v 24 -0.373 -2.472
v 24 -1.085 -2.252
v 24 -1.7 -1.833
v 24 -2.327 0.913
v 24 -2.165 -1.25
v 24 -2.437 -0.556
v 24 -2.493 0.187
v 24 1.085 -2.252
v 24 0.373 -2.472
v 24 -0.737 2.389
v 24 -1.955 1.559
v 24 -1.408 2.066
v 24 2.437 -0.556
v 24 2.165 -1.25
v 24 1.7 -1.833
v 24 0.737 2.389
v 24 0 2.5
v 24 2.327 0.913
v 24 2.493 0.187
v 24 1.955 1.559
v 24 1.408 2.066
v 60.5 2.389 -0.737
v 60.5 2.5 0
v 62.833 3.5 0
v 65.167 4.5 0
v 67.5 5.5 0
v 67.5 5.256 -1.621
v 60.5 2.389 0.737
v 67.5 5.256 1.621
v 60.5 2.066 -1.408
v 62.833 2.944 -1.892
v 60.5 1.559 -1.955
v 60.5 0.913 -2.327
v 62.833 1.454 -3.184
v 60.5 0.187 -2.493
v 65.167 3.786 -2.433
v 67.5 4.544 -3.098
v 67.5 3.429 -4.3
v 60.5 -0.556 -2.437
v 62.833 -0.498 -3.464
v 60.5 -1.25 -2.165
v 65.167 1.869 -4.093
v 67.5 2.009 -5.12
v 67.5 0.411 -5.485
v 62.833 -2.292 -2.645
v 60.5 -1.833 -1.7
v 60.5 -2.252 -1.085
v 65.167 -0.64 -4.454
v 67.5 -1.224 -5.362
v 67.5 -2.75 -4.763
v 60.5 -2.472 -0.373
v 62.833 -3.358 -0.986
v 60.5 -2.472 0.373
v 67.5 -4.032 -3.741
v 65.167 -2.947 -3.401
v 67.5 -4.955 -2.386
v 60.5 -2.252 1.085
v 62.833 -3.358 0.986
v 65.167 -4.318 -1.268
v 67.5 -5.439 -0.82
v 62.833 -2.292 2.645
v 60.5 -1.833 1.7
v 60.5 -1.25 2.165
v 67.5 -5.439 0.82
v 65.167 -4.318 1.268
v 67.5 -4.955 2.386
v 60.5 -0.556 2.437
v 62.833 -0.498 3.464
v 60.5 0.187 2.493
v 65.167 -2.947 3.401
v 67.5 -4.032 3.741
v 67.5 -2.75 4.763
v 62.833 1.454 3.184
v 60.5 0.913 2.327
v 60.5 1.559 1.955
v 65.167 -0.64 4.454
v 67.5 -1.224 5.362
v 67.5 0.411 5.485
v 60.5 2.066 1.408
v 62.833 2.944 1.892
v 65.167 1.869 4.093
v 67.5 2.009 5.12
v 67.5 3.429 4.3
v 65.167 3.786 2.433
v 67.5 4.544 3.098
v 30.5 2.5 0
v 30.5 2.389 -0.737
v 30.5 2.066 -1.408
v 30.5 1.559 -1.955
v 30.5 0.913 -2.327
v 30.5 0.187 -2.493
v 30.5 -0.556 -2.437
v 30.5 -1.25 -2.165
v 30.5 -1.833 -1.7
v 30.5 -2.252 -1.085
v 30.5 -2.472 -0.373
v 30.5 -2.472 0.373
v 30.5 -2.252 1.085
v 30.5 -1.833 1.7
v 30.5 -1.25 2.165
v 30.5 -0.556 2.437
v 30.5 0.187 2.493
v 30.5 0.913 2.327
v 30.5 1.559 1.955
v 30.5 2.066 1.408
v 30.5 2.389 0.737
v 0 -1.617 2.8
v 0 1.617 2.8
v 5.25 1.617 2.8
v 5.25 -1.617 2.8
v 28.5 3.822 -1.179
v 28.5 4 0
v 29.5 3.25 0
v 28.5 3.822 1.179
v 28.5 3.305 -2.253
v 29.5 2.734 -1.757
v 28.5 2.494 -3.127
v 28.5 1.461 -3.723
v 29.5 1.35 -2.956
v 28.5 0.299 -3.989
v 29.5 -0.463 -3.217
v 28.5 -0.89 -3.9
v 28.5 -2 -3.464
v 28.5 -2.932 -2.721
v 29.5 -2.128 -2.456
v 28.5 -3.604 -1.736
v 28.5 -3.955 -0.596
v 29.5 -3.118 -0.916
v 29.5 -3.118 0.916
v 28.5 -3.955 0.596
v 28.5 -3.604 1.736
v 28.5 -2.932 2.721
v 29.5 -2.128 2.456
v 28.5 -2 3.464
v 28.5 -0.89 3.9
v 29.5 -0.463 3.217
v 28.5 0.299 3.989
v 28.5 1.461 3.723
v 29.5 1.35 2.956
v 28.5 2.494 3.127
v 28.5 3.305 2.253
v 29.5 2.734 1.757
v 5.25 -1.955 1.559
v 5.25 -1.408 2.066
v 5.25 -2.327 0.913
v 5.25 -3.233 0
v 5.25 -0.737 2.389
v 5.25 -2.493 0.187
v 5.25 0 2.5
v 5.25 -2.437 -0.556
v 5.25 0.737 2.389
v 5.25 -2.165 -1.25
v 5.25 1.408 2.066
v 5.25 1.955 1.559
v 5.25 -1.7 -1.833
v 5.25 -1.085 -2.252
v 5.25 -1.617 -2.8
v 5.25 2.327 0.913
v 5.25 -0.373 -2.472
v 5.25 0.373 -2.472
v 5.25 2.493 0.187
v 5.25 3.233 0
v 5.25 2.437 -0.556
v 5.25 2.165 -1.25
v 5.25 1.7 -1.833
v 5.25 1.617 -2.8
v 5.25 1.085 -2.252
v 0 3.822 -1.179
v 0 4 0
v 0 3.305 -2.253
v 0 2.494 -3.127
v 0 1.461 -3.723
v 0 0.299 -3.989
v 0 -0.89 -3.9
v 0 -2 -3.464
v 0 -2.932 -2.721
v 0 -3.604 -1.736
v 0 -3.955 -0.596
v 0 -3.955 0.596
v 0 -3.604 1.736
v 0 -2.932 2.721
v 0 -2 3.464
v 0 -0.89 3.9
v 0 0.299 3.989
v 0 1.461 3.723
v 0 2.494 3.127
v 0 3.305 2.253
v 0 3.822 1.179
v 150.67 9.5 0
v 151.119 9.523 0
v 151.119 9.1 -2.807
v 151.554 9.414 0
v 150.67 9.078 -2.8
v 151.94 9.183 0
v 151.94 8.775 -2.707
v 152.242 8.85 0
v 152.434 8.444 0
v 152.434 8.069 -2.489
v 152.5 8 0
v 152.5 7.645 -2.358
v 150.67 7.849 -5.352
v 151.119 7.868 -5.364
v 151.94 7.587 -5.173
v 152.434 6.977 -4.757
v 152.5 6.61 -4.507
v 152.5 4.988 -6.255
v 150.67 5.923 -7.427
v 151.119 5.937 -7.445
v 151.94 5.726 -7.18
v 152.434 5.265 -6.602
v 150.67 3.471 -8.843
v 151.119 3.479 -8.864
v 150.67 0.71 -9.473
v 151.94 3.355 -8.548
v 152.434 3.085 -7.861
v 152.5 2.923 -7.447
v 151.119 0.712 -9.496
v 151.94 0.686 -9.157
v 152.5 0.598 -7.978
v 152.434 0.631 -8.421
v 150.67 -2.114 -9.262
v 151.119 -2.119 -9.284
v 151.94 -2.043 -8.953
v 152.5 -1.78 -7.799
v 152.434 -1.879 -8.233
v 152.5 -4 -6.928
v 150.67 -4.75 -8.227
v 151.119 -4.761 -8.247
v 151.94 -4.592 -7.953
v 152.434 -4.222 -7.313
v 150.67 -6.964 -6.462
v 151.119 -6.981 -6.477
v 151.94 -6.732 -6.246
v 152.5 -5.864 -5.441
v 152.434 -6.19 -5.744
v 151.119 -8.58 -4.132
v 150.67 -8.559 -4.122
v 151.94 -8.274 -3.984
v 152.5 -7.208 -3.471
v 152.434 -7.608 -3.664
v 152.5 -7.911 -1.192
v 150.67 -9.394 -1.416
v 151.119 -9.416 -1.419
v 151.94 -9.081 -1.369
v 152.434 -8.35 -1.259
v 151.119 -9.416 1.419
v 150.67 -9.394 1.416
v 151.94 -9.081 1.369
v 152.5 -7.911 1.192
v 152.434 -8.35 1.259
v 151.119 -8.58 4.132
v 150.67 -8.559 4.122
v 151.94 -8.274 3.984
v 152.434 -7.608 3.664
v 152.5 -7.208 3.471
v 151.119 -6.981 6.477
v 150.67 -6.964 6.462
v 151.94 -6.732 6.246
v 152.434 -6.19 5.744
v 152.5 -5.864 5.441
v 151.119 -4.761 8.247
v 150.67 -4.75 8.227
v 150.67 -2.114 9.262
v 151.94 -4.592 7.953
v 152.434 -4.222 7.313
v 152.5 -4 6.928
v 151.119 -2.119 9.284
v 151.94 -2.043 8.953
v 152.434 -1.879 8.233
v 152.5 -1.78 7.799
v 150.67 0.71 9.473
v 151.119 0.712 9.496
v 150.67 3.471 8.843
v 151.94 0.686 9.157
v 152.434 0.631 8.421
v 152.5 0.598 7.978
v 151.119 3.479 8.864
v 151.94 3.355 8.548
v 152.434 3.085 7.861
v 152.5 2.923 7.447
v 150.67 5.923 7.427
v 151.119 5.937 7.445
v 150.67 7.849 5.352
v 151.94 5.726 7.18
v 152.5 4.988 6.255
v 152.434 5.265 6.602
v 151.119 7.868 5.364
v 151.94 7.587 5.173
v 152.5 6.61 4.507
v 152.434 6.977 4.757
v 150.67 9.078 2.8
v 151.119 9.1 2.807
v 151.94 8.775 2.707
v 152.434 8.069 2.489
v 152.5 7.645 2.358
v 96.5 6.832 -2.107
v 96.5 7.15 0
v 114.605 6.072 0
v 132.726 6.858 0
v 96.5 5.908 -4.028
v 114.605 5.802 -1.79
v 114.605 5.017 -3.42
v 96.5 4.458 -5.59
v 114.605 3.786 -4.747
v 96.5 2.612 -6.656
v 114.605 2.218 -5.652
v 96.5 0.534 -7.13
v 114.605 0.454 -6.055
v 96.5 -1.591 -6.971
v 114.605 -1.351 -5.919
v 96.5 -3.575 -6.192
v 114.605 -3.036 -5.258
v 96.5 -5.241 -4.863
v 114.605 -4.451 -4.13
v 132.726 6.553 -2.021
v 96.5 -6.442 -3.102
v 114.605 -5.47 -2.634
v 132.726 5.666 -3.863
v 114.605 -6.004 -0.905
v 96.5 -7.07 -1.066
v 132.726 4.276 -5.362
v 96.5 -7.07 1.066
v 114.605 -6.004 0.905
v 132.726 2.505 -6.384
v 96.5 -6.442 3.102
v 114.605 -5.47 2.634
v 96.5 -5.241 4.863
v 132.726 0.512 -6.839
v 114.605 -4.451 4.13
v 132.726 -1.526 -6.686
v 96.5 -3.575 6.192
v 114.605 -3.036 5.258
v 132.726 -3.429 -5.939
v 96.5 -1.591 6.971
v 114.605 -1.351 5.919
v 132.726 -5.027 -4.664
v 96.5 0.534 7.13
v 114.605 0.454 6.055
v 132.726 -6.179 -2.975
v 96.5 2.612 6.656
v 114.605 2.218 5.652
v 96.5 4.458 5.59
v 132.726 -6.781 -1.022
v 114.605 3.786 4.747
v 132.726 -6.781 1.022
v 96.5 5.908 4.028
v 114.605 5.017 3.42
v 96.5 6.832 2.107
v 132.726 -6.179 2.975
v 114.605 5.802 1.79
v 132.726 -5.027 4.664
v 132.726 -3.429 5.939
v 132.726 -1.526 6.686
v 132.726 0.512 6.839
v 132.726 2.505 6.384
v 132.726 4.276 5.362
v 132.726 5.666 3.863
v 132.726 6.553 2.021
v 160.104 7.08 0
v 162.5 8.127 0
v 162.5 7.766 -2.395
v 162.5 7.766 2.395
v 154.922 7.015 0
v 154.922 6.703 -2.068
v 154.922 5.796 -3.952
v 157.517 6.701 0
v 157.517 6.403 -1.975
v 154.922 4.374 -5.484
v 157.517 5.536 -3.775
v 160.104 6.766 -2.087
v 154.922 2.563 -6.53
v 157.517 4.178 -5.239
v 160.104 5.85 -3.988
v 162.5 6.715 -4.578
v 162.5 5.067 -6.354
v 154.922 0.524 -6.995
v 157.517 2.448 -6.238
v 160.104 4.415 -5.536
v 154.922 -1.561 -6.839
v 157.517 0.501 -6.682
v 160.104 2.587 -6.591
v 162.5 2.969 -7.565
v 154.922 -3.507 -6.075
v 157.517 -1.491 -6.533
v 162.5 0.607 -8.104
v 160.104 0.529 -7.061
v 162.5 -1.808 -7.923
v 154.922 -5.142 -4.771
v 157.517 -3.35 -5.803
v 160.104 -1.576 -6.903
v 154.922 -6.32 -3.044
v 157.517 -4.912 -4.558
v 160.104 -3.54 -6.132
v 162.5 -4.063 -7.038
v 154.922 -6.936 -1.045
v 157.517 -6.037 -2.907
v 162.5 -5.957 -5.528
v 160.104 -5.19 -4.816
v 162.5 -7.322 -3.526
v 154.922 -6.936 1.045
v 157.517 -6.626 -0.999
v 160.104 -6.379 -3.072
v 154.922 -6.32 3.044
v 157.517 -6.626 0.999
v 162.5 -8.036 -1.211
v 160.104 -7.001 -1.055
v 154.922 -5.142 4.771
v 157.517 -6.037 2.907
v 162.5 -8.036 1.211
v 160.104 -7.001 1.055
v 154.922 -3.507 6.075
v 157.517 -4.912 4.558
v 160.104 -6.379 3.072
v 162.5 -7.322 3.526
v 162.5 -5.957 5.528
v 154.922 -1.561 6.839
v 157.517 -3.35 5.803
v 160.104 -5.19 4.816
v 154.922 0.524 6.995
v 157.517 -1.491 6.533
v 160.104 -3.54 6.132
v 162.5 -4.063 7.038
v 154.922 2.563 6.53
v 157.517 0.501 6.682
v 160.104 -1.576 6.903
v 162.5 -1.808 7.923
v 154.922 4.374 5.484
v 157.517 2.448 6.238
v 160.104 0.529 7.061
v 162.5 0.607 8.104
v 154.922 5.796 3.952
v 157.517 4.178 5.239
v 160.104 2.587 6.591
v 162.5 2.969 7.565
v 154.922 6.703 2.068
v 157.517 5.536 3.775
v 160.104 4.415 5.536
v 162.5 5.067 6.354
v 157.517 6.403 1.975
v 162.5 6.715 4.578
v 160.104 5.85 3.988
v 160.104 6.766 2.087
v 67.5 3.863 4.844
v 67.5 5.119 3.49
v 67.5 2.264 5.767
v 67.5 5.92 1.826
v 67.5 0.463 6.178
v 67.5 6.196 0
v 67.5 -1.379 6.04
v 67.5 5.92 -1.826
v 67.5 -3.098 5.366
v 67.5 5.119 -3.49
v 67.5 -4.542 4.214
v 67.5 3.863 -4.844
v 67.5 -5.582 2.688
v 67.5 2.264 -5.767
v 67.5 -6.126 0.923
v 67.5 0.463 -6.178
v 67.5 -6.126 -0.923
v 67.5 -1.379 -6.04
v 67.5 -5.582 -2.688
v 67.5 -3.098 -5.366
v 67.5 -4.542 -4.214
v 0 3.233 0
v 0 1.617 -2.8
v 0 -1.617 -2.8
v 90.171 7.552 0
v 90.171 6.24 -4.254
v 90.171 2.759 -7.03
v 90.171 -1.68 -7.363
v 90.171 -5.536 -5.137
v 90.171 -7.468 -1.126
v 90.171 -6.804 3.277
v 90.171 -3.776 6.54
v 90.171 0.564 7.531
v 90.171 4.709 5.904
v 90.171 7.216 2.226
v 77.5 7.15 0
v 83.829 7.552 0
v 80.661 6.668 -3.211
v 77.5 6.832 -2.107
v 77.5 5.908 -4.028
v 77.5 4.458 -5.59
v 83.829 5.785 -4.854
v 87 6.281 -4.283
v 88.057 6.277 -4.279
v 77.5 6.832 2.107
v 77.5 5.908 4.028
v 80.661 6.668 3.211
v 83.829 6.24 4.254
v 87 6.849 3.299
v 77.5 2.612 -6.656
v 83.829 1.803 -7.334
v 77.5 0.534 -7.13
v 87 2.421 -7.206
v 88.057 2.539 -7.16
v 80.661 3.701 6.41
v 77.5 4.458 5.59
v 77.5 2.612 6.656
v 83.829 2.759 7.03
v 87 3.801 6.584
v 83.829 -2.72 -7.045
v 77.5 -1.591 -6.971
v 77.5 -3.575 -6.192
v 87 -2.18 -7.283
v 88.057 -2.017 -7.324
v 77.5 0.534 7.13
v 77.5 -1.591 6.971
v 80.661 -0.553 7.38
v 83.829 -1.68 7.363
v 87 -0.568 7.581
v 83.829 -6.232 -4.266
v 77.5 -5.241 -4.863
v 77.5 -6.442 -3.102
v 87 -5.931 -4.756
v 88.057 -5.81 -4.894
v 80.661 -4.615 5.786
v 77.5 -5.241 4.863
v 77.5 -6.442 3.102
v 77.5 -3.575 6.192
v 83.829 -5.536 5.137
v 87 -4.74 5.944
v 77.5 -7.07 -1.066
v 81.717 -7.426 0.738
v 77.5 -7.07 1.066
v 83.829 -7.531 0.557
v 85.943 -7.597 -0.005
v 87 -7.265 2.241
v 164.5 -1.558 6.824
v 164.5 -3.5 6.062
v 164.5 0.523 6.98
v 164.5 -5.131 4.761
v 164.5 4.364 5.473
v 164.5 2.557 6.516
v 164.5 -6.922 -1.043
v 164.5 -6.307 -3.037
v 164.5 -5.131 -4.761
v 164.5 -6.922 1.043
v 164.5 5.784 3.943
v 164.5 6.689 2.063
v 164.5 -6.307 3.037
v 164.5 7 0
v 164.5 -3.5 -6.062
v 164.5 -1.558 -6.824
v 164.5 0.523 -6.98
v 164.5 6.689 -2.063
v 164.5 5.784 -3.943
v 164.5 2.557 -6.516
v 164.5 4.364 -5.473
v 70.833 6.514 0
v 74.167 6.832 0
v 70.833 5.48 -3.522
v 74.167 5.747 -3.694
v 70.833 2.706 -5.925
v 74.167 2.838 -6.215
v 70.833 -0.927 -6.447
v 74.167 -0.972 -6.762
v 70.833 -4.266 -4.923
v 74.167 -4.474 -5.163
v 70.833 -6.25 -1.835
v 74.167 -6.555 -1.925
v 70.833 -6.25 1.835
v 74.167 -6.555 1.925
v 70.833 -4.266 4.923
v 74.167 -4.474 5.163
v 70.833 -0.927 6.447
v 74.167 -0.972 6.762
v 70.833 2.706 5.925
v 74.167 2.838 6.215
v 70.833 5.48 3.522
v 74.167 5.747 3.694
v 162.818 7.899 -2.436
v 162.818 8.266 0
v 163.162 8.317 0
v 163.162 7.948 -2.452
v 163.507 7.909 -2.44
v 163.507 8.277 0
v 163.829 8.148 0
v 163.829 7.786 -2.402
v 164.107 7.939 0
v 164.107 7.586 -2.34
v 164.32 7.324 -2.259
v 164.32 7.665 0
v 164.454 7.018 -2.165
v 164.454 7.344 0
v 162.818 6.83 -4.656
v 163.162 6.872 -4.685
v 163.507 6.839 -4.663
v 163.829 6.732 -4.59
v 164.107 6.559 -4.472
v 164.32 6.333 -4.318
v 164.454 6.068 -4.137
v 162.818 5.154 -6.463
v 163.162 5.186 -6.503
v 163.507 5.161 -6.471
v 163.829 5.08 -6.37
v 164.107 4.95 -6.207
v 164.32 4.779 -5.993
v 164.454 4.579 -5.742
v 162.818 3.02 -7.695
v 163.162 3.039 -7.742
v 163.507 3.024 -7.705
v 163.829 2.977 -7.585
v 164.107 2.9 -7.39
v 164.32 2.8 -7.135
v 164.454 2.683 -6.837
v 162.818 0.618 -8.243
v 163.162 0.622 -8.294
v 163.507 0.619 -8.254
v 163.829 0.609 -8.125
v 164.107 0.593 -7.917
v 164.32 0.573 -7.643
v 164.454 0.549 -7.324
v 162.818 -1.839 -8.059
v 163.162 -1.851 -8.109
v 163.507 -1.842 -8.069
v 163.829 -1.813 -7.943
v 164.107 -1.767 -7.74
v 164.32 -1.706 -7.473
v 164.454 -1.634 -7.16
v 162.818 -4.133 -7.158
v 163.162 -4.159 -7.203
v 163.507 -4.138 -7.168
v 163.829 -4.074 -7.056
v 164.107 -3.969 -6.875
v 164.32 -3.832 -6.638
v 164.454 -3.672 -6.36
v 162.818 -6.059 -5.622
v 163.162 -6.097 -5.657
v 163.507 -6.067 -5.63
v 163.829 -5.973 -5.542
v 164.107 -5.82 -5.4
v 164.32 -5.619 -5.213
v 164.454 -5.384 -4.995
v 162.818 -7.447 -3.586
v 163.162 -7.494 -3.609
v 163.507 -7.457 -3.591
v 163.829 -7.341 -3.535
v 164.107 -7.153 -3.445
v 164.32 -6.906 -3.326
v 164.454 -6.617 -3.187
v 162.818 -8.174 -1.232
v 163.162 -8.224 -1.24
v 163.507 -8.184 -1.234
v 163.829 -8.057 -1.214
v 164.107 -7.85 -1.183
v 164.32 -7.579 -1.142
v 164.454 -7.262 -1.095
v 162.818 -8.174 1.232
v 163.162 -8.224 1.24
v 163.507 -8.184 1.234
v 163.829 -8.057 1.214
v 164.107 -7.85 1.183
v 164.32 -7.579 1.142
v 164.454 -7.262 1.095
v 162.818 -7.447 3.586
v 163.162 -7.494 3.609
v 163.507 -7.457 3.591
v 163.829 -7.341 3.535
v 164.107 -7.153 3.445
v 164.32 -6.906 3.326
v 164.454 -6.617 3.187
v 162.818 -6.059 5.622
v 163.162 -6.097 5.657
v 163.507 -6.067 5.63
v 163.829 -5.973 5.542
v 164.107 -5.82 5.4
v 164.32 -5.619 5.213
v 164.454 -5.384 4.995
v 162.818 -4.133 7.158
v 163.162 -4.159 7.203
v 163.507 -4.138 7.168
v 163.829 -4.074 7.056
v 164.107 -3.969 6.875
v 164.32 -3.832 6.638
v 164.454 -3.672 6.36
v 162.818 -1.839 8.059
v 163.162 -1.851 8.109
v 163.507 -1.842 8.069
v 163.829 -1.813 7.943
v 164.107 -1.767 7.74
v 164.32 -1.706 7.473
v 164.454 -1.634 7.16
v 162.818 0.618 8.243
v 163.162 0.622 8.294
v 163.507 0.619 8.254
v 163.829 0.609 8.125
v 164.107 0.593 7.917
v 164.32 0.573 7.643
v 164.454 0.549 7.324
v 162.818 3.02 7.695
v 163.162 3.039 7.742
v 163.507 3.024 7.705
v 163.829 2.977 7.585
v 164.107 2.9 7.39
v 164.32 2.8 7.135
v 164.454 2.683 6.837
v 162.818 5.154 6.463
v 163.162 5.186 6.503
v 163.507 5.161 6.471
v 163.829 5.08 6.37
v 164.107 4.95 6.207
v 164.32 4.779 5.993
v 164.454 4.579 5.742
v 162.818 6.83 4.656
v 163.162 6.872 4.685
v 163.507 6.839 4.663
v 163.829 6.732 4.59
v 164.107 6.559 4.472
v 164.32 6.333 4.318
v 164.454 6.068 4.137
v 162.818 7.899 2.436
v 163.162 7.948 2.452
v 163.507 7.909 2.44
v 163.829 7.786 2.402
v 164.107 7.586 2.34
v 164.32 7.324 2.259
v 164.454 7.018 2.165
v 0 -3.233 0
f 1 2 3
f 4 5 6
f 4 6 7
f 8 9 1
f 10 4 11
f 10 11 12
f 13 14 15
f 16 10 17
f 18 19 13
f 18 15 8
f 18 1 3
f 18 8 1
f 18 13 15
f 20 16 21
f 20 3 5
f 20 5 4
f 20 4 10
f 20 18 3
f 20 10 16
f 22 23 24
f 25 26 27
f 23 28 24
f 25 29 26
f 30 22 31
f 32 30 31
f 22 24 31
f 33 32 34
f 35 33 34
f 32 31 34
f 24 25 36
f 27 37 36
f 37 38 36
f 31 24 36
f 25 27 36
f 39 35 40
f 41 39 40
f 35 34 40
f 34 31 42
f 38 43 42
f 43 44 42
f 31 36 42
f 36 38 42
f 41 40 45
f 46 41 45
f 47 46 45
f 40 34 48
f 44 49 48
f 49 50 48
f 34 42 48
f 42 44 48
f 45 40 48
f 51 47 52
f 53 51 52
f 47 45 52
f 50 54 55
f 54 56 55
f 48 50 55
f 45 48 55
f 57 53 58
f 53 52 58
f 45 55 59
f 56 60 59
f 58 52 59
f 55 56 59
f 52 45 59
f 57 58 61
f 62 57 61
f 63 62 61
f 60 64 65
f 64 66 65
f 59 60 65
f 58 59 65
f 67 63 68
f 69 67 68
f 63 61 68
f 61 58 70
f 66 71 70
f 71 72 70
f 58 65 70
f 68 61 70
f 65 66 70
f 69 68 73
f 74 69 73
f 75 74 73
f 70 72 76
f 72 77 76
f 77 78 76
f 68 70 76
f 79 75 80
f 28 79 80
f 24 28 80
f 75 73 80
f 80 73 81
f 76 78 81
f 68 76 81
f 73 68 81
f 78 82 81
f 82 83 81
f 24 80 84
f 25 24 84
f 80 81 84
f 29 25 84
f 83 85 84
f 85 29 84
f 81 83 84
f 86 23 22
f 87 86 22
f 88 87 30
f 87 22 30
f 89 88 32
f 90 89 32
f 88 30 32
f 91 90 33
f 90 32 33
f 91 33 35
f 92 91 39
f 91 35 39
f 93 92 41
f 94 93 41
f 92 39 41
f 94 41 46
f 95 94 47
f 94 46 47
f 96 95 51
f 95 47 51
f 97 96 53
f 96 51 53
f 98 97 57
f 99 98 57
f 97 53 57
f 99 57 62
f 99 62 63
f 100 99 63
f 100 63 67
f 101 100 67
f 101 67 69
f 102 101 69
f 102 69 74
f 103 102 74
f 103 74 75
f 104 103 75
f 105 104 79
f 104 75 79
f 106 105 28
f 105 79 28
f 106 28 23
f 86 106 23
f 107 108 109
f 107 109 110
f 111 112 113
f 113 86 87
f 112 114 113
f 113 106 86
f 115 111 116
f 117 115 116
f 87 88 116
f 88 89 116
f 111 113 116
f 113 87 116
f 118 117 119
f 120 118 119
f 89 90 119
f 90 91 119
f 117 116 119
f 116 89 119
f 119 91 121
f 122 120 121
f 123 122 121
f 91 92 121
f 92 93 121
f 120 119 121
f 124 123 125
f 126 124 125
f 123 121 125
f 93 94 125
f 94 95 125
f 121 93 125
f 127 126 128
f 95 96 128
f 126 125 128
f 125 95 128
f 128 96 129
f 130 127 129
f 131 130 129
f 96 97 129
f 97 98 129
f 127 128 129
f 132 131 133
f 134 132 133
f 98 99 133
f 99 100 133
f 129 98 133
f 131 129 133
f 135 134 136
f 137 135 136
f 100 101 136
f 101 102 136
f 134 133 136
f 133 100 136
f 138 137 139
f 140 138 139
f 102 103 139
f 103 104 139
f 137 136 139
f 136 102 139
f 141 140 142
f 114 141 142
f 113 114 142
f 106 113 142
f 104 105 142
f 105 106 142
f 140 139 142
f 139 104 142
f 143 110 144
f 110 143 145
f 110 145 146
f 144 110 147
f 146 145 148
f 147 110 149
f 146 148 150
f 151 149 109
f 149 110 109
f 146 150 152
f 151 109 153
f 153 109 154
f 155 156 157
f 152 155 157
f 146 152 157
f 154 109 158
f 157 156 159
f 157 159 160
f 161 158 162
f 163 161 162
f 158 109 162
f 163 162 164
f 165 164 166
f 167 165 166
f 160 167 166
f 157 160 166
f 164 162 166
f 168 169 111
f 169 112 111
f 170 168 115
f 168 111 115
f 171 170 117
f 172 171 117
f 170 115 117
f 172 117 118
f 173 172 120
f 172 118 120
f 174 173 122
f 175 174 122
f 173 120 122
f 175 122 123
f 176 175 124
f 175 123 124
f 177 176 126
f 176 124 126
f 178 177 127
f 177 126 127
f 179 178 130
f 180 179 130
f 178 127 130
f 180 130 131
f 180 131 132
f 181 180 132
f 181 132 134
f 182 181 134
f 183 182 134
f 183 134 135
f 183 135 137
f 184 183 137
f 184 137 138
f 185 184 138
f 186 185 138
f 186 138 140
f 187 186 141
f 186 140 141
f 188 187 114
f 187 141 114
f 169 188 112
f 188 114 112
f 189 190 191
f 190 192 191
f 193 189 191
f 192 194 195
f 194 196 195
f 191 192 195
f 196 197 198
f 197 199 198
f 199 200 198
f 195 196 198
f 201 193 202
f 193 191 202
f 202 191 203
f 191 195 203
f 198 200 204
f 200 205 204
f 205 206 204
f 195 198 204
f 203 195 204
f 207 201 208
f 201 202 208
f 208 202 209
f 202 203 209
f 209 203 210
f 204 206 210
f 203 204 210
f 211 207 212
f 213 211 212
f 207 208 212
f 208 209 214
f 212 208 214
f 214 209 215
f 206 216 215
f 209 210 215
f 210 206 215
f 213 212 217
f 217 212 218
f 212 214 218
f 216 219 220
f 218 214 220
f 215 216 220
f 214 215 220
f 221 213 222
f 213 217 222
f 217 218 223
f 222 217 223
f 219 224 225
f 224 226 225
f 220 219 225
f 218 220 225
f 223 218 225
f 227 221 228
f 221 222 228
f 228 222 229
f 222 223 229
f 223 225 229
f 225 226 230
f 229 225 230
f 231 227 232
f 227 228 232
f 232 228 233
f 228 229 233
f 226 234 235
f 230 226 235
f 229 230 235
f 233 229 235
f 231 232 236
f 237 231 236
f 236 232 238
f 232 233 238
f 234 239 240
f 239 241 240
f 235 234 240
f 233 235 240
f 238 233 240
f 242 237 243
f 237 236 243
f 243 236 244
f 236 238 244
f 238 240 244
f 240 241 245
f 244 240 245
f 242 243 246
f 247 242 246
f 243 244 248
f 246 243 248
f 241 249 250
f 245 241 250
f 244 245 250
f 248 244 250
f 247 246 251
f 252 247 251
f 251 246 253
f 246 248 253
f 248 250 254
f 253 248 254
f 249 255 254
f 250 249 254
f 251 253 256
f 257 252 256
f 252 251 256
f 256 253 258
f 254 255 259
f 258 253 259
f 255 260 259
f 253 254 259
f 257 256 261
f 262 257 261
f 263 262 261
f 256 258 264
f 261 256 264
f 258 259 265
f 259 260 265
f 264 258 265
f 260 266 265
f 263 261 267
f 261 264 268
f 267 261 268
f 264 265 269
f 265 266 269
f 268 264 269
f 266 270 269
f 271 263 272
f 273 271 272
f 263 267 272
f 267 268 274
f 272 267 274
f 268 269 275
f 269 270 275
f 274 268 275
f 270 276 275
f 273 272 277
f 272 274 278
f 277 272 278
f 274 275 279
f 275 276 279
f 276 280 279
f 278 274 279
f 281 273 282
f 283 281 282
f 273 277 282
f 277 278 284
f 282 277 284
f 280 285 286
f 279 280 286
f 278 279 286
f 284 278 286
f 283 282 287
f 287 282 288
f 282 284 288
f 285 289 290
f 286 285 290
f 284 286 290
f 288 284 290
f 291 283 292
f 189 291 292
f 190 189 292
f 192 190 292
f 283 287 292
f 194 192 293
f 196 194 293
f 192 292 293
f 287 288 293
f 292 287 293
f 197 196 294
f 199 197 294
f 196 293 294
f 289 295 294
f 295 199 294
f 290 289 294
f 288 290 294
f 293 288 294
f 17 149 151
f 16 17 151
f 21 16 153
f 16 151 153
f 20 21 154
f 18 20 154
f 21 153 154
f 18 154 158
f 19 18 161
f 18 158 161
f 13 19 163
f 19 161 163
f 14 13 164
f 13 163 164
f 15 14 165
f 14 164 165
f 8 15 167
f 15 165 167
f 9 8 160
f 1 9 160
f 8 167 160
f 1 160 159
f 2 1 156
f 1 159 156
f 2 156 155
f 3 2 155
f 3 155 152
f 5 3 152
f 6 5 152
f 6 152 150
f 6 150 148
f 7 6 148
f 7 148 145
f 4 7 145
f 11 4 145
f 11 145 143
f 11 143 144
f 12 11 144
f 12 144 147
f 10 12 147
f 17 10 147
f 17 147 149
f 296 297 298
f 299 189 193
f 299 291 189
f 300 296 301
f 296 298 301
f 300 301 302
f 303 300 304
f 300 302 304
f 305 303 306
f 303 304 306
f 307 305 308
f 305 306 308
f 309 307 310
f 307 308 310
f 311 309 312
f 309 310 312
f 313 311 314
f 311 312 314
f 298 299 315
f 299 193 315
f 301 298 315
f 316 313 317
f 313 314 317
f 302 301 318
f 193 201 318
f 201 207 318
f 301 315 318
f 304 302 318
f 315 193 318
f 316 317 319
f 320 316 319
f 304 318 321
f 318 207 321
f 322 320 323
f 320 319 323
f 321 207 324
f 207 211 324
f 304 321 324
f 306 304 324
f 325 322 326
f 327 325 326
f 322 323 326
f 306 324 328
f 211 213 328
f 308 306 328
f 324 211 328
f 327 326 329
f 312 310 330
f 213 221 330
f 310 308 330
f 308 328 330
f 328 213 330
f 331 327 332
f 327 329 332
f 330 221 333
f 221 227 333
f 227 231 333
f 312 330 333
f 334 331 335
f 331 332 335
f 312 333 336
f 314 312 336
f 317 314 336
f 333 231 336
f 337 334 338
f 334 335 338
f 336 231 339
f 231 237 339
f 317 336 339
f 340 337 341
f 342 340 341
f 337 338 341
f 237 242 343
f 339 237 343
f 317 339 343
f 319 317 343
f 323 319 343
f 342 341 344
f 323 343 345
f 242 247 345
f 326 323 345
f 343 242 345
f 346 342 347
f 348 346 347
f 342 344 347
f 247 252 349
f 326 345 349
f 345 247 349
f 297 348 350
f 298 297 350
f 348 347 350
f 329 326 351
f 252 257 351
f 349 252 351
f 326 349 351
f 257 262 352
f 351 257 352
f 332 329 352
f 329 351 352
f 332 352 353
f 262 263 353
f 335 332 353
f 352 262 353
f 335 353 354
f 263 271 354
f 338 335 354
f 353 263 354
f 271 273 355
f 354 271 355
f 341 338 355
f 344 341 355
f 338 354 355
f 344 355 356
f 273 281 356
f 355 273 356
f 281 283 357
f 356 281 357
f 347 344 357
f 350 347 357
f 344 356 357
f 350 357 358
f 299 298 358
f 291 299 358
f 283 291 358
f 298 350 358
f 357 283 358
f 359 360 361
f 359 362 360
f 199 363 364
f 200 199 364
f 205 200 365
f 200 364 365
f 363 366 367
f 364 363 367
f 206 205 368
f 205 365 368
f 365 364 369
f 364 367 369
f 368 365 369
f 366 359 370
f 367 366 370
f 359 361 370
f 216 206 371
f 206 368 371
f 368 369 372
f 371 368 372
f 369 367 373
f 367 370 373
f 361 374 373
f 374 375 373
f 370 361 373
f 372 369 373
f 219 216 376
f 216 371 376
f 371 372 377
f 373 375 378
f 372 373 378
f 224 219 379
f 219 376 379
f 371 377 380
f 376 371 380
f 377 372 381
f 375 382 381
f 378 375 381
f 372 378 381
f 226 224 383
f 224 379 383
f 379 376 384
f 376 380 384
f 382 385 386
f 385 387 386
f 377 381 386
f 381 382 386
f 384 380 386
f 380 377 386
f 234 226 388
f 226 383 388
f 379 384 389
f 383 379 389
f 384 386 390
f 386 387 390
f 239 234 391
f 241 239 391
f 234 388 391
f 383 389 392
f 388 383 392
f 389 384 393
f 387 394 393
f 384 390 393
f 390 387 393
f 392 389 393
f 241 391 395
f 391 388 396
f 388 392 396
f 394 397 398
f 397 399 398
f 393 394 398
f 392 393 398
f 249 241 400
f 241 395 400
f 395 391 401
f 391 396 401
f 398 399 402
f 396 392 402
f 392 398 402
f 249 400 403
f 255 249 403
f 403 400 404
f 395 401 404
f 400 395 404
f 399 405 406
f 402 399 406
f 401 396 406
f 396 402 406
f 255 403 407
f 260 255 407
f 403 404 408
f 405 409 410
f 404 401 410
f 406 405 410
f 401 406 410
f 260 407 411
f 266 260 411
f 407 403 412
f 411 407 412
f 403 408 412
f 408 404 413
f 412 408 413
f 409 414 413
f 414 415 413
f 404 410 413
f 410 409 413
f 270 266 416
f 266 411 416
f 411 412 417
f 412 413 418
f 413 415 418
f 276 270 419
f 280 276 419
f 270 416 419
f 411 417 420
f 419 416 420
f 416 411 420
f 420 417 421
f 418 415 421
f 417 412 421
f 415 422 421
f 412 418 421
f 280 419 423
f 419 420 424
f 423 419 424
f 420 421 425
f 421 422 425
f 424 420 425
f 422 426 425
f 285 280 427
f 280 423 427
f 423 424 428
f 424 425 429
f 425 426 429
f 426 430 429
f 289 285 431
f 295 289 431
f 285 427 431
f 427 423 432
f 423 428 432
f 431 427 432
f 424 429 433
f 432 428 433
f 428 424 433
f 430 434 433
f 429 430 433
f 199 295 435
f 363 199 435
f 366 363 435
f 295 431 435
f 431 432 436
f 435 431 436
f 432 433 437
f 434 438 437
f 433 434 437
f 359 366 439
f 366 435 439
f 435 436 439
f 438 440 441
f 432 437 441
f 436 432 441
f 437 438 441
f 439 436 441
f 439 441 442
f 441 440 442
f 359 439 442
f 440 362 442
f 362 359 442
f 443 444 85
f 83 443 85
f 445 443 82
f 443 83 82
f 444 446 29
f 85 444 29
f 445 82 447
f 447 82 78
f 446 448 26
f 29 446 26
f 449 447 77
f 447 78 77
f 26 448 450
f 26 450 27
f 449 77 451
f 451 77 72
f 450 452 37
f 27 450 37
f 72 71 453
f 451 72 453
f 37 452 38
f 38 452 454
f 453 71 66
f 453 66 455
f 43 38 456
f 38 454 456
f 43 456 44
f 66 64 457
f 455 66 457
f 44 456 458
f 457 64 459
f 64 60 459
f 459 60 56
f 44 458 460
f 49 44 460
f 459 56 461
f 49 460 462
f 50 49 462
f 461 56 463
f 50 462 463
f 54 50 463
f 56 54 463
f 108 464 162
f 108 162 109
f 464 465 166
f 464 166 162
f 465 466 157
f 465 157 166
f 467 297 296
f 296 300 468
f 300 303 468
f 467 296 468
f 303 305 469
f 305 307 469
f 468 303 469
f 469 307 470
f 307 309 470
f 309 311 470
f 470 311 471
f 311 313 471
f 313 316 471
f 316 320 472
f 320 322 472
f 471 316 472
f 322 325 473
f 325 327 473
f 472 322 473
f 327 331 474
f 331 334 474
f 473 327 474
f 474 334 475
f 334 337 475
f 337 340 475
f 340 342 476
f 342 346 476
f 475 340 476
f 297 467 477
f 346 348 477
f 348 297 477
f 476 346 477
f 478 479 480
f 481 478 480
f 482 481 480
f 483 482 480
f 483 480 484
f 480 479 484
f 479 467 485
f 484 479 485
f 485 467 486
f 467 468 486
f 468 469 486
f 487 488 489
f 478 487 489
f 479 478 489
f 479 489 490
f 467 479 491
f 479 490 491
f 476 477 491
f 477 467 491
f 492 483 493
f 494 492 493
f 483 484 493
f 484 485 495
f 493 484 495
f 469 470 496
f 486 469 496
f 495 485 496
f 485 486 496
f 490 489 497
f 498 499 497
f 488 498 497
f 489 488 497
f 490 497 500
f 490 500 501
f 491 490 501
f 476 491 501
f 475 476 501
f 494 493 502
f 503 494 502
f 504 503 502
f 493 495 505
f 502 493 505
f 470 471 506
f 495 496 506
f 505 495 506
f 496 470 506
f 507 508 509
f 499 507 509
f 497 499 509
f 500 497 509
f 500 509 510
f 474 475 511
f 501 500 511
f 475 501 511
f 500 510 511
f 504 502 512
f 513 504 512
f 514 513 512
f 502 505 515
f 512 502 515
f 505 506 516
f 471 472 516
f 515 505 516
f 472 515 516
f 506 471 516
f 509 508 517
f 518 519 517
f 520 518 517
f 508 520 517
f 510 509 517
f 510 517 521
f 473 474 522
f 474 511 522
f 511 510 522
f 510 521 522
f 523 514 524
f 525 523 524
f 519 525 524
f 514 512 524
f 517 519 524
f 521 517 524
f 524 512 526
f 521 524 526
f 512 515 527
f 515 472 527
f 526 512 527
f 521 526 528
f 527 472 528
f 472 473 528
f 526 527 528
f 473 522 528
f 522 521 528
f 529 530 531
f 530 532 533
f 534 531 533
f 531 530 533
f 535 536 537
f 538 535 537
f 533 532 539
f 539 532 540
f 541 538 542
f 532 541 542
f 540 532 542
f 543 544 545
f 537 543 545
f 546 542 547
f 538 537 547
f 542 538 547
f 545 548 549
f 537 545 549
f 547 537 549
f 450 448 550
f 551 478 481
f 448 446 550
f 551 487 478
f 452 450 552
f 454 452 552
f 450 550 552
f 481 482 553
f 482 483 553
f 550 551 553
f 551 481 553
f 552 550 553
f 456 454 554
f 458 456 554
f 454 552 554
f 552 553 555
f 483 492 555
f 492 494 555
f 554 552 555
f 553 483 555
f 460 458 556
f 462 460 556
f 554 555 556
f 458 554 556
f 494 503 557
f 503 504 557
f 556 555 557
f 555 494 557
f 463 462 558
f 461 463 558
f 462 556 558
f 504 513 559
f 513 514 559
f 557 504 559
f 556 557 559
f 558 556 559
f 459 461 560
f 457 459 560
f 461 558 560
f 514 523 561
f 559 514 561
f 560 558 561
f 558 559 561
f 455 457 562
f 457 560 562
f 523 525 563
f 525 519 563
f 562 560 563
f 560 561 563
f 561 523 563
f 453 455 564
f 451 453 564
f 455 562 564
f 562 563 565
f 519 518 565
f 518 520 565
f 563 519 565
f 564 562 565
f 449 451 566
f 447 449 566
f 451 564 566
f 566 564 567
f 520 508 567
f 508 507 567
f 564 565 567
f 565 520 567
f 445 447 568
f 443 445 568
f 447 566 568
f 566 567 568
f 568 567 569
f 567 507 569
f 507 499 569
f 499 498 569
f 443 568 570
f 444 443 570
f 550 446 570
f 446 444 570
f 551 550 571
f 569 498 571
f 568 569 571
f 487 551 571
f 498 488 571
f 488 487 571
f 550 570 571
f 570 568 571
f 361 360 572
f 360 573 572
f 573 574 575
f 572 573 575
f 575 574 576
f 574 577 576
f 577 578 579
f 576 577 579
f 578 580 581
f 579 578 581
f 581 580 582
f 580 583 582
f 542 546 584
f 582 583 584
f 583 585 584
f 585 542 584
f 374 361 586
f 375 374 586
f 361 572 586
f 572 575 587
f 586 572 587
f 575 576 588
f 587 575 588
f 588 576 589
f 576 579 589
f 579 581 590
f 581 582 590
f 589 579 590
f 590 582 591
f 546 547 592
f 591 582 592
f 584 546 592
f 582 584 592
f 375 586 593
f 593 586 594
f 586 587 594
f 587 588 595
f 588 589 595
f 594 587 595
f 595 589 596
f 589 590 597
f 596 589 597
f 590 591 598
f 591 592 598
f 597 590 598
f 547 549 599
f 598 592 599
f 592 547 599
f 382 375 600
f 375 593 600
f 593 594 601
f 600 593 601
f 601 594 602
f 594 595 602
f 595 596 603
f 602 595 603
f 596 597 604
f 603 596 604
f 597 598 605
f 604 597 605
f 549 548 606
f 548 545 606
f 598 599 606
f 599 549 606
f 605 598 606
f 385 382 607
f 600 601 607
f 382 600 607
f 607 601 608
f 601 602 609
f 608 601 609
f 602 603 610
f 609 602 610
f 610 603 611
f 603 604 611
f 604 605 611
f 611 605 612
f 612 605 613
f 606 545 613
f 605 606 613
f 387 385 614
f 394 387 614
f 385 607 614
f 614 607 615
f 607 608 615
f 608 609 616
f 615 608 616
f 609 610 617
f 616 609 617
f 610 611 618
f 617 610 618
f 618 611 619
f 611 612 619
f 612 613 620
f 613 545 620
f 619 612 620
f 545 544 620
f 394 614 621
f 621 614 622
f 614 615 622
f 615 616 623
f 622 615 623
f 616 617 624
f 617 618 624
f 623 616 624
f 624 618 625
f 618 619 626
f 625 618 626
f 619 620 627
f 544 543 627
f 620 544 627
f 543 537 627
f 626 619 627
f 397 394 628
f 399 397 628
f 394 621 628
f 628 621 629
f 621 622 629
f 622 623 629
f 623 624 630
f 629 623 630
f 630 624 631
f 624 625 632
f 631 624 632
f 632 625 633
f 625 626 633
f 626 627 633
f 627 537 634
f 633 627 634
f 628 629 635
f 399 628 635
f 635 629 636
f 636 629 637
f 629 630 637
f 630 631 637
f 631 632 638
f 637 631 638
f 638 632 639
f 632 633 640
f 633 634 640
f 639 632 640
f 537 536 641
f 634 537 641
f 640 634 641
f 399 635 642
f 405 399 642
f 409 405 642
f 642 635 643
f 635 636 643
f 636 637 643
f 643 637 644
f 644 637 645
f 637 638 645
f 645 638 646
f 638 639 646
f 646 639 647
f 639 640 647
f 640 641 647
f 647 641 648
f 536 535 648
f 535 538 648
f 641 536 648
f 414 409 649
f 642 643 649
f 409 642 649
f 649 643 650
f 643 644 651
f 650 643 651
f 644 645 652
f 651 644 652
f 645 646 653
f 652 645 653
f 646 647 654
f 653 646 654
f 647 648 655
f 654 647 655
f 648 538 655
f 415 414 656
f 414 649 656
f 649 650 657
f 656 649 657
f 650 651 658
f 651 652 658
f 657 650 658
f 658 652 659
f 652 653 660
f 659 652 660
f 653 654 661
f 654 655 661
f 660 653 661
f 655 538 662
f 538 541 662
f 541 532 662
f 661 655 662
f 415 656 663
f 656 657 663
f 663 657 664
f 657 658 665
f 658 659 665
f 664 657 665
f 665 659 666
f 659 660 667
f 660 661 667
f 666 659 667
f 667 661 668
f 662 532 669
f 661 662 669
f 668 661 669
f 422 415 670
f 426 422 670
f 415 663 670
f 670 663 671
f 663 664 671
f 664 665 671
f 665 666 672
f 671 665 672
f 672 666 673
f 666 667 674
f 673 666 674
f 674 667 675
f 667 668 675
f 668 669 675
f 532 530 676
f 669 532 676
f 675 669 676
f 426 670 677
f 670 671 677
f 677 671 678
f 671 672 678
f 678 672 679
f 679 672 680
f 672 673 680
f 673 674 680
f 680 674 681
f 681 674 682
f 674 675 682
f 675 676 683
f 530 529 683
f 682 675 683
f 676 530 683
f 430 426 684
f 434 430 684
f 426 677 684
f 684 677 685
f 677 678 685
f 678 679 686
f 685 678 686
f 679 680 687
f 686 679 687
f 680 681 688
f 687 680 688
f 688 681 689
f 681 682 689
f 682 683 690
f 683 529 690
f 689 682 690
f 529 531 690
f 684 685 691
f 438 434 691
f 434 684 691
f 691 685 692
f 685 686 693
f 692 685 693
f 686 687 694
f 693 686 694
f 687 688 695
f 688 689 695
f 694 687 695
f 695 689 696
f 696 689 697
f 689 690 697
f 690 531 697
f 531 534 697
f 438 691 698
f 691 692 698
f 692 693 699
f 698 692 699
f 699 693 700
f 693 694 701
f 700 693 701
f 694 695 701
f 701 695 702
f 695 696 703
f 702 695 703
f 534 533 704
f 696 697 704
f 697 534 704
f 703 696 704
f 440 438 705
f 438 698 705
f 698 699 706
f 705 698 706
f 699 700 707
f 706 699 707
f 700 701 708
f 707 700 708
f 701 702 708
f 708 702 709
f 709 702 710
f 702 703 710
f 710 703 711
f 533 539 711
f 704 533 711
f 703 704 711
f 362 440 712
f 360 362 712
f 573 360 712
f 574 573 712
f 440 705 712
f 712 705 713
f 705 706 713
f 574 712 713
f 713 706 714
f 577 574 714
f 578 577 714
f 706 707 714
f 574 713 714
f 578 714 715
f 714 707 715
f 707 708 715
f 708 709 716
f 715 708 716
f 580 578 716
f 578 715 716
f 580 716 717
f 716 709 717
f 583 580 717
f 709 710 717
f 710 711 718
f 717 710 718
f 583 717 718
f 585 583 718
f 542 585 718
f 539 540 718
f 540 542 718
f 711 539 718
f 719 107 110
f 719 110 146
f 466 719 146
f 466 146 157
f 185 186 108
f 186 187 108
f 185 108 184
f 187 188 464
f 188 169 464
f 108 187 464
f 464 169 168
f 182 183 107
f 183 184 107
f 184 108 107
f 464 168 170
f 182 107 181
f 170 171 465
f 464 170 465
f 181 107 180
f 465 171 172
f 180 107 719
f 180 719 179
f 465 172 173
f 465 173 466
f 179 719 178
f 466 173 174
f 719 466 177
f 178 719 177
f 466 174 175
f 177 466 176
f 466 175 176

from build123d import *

# Parameters (mm, degrees)
HEXAGONALHEAD_DEPTH       = 5.25
SKETCH3_R                 = 2.5
CIRCULARCENTRALHOLE_DEPTH = 24


with BuildPart() as part:
    # Sketch1 → AluminiumPart (revolve)
    with BuildSketch(Plane.XY):
        Polygon((0, 4), (28.5, 4), (30.5, 2.5), (60.5, 2.5), (60.5, 0), (0, 0), align=None)
    revolve(axis=Axis((184.722030444, 0, 0), (-1, 0, 0)))

    # Sketch2 → HexagonalHead (cut)
    with BuildSketch(Plane.ZY):
        Polygon((-2.8, 1.616580754), (0, 3.233161507), (2.8, 1.616580754), (2.8, -1.616580754), (0, -3.233161507), (-2.8, -1.616580754), align=None)
    extrude(amount=-HEXAGONALHEAD_DEPTH, mode=Mode.SUBTRACT)

    # Sketch3 → CircularCentralHole (cut)
    with BuildSketch(Plane.ZY):
        Circle(SKETCH3_R)
    extrude(amount=-CIRCULARCENTRALHOLE_DEPTH, mode=Mode.SUBTRACT)

    # Sketch4 → FirstGreenPart (revolve)
    with BuildSketch(Plane.XY):
        Polygon((60.5, 0), (60.5, 2.5), (67.5, 5.5), (67.5, 0), align=None)
    revolve(axis=Axis((184.722030444, 0, 0), (-1, 0, 0)))

    # Sketch5 → FirstBlackPart (revolve)
    with BuildSketch(Plane.XY):
        with BuildLine():
            Line((67.5, 6.195683888), (77.5, 7.15))
            ThreePointArc((77.5, 7.15), (87, 7.602272753), (96.5, 7.15))
            Line((96.5, 7.15), (96.5, 0))
            Line((96.5, 0), (67.5, 0))
            Line((67.5, 0), (67.5, 6.195683888))
        make_face()
    revolve(axis=Axis((184.722030444, 0, 0), (-1, 0, 0)))

    # Sketch6 → SecondGreenPart (revolve)
    with BuildSketch(Plane.XY):
        with BuildLine():
            Line((152.5, 8), (152.5, 0))
            Line((152.5, 0), (96.5, 0))
            Line((96.5, 0), (96.5, 7.15))
            ThreePointArc((96.5, 7.15), (123.675746685, 6.231641521), (150.66986499, 9.5))
            ThreePointArc((150.66986499, 9.5), (151.939948886, 9.183151951), (152.5, 8))
        make_face()
    revolve(axis=Axis((184.722030444, 0, 0), (-1, 0, 0)))

    # Sketch7 → LastBlackPart (revolve)
    with BuildSketch(Plane.XY):
        with BuildLine():
            Line((152.5, 0), (152.5, 8))
            ThreePointArc((152.5, 8), (157.517257353, 6.700790451), (162.5, 8.126655981))
            ThreePointArc((162.5, 8.126655981), (163.829223328, 8.147753643), (164.5, 7))
            Line((164.5, 7), (164.5, 0))
            Line((164.5, 0), (152.5, 0))
        make_face()
    revolve(axis=Axis((184.722030444, 0, 0), (-1, 0, 0)))


solid = part.part
